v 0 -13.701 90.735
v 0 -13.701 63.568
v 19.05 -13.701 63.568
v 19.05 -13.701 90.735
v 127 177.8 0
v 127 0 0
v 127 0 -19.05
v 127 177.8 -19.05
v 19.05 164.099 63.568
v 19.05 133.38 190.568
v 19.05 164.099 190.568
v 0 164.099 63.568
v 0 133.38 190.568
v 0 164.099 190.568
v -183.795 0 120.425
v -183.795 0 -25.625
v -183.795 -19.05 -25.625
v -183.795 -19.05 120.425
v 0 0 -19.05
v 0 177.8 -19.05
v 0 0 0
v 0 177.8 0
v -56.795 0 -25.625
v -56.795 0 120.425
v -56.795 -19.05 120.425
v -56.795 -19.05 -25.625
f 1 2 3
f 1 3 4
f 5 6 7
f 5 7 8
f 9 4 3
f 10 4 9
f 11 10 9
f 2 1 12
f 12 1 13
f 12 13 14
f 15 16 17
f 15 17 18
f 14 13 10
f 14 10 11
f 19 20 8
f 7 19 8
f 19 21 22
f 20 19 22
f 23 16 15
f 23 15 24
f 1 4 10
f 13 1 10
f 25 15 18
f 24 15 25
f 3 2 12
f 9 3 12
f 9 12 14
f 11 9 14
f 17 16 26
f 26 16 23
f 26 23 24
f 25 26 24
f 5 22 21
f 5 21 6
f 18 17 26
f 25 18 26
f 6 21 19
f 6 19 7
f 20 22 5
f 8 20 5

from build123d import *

# Parameters (mm, degrees)
F0_W     = 127
F0_H     = 177.8
F1_DEPTH = 19.05
F2_W     = 177.8
F2_H     = 127
F3_DEPTH = 19.05
F5_DEPTH = 25.4
F7_DEPTH = 25.4
F8_W     = 127
F8_H     = 146.05
F9_DEPTH = 19.05


with BuildPart() as f1:
    # F0 (on Top) → F1 (new body)
    with BuildSketch(Plane.XY):
        with Locations((63.5, 88.9)):
            Rectangle(F0_W, F0_H)
    extrude(amount=-F1_DEPTH)


with BuildPart() as f3:
    # F2 (on Right) → F3 (new body)
    with BuildSketch(Plane.YZ):
        with Locations((75.199423, 127.068141)):
            Rectangle(F2_W, F2_H)
    extrude(amount=F3_DEPTH)

    # F4 (on face) → F5 (cut)
    with BuildSketch(Plane.YZ.offset(19.05)):
        Polygon((-13.700577, 124.175191), (86.697571, 190.568141), (-13.700577, 190.568141), align=None)
    extrude(amount=-F5_DEPTH, mode=Mode.SUBTRACT)

    # F6 (on face) → F7 (cut)
    with BuildSketch(Plane.YZ.offset(19.05)):
        Polygon((-13.700577, 90.734757), (133.379653, 190.568141), (86.697571, 190.568141), (-13.700577, 124.175191), align=None)
    extrude(amount=-F7_DEPTH, mode=Mode.SUBTRACT)


with BuildPart() as f9:
    # F8 (on Front) → F9 (new body)
    with BuildSketch(Plane.XZ):
        with Locations((-120.29523, 47.399963)):
            Rectangle(F8_W, F8_H)
    extrude(amount=F9_DEPTH)


solid = Compound([f1.part, f3.part, f9.part])
